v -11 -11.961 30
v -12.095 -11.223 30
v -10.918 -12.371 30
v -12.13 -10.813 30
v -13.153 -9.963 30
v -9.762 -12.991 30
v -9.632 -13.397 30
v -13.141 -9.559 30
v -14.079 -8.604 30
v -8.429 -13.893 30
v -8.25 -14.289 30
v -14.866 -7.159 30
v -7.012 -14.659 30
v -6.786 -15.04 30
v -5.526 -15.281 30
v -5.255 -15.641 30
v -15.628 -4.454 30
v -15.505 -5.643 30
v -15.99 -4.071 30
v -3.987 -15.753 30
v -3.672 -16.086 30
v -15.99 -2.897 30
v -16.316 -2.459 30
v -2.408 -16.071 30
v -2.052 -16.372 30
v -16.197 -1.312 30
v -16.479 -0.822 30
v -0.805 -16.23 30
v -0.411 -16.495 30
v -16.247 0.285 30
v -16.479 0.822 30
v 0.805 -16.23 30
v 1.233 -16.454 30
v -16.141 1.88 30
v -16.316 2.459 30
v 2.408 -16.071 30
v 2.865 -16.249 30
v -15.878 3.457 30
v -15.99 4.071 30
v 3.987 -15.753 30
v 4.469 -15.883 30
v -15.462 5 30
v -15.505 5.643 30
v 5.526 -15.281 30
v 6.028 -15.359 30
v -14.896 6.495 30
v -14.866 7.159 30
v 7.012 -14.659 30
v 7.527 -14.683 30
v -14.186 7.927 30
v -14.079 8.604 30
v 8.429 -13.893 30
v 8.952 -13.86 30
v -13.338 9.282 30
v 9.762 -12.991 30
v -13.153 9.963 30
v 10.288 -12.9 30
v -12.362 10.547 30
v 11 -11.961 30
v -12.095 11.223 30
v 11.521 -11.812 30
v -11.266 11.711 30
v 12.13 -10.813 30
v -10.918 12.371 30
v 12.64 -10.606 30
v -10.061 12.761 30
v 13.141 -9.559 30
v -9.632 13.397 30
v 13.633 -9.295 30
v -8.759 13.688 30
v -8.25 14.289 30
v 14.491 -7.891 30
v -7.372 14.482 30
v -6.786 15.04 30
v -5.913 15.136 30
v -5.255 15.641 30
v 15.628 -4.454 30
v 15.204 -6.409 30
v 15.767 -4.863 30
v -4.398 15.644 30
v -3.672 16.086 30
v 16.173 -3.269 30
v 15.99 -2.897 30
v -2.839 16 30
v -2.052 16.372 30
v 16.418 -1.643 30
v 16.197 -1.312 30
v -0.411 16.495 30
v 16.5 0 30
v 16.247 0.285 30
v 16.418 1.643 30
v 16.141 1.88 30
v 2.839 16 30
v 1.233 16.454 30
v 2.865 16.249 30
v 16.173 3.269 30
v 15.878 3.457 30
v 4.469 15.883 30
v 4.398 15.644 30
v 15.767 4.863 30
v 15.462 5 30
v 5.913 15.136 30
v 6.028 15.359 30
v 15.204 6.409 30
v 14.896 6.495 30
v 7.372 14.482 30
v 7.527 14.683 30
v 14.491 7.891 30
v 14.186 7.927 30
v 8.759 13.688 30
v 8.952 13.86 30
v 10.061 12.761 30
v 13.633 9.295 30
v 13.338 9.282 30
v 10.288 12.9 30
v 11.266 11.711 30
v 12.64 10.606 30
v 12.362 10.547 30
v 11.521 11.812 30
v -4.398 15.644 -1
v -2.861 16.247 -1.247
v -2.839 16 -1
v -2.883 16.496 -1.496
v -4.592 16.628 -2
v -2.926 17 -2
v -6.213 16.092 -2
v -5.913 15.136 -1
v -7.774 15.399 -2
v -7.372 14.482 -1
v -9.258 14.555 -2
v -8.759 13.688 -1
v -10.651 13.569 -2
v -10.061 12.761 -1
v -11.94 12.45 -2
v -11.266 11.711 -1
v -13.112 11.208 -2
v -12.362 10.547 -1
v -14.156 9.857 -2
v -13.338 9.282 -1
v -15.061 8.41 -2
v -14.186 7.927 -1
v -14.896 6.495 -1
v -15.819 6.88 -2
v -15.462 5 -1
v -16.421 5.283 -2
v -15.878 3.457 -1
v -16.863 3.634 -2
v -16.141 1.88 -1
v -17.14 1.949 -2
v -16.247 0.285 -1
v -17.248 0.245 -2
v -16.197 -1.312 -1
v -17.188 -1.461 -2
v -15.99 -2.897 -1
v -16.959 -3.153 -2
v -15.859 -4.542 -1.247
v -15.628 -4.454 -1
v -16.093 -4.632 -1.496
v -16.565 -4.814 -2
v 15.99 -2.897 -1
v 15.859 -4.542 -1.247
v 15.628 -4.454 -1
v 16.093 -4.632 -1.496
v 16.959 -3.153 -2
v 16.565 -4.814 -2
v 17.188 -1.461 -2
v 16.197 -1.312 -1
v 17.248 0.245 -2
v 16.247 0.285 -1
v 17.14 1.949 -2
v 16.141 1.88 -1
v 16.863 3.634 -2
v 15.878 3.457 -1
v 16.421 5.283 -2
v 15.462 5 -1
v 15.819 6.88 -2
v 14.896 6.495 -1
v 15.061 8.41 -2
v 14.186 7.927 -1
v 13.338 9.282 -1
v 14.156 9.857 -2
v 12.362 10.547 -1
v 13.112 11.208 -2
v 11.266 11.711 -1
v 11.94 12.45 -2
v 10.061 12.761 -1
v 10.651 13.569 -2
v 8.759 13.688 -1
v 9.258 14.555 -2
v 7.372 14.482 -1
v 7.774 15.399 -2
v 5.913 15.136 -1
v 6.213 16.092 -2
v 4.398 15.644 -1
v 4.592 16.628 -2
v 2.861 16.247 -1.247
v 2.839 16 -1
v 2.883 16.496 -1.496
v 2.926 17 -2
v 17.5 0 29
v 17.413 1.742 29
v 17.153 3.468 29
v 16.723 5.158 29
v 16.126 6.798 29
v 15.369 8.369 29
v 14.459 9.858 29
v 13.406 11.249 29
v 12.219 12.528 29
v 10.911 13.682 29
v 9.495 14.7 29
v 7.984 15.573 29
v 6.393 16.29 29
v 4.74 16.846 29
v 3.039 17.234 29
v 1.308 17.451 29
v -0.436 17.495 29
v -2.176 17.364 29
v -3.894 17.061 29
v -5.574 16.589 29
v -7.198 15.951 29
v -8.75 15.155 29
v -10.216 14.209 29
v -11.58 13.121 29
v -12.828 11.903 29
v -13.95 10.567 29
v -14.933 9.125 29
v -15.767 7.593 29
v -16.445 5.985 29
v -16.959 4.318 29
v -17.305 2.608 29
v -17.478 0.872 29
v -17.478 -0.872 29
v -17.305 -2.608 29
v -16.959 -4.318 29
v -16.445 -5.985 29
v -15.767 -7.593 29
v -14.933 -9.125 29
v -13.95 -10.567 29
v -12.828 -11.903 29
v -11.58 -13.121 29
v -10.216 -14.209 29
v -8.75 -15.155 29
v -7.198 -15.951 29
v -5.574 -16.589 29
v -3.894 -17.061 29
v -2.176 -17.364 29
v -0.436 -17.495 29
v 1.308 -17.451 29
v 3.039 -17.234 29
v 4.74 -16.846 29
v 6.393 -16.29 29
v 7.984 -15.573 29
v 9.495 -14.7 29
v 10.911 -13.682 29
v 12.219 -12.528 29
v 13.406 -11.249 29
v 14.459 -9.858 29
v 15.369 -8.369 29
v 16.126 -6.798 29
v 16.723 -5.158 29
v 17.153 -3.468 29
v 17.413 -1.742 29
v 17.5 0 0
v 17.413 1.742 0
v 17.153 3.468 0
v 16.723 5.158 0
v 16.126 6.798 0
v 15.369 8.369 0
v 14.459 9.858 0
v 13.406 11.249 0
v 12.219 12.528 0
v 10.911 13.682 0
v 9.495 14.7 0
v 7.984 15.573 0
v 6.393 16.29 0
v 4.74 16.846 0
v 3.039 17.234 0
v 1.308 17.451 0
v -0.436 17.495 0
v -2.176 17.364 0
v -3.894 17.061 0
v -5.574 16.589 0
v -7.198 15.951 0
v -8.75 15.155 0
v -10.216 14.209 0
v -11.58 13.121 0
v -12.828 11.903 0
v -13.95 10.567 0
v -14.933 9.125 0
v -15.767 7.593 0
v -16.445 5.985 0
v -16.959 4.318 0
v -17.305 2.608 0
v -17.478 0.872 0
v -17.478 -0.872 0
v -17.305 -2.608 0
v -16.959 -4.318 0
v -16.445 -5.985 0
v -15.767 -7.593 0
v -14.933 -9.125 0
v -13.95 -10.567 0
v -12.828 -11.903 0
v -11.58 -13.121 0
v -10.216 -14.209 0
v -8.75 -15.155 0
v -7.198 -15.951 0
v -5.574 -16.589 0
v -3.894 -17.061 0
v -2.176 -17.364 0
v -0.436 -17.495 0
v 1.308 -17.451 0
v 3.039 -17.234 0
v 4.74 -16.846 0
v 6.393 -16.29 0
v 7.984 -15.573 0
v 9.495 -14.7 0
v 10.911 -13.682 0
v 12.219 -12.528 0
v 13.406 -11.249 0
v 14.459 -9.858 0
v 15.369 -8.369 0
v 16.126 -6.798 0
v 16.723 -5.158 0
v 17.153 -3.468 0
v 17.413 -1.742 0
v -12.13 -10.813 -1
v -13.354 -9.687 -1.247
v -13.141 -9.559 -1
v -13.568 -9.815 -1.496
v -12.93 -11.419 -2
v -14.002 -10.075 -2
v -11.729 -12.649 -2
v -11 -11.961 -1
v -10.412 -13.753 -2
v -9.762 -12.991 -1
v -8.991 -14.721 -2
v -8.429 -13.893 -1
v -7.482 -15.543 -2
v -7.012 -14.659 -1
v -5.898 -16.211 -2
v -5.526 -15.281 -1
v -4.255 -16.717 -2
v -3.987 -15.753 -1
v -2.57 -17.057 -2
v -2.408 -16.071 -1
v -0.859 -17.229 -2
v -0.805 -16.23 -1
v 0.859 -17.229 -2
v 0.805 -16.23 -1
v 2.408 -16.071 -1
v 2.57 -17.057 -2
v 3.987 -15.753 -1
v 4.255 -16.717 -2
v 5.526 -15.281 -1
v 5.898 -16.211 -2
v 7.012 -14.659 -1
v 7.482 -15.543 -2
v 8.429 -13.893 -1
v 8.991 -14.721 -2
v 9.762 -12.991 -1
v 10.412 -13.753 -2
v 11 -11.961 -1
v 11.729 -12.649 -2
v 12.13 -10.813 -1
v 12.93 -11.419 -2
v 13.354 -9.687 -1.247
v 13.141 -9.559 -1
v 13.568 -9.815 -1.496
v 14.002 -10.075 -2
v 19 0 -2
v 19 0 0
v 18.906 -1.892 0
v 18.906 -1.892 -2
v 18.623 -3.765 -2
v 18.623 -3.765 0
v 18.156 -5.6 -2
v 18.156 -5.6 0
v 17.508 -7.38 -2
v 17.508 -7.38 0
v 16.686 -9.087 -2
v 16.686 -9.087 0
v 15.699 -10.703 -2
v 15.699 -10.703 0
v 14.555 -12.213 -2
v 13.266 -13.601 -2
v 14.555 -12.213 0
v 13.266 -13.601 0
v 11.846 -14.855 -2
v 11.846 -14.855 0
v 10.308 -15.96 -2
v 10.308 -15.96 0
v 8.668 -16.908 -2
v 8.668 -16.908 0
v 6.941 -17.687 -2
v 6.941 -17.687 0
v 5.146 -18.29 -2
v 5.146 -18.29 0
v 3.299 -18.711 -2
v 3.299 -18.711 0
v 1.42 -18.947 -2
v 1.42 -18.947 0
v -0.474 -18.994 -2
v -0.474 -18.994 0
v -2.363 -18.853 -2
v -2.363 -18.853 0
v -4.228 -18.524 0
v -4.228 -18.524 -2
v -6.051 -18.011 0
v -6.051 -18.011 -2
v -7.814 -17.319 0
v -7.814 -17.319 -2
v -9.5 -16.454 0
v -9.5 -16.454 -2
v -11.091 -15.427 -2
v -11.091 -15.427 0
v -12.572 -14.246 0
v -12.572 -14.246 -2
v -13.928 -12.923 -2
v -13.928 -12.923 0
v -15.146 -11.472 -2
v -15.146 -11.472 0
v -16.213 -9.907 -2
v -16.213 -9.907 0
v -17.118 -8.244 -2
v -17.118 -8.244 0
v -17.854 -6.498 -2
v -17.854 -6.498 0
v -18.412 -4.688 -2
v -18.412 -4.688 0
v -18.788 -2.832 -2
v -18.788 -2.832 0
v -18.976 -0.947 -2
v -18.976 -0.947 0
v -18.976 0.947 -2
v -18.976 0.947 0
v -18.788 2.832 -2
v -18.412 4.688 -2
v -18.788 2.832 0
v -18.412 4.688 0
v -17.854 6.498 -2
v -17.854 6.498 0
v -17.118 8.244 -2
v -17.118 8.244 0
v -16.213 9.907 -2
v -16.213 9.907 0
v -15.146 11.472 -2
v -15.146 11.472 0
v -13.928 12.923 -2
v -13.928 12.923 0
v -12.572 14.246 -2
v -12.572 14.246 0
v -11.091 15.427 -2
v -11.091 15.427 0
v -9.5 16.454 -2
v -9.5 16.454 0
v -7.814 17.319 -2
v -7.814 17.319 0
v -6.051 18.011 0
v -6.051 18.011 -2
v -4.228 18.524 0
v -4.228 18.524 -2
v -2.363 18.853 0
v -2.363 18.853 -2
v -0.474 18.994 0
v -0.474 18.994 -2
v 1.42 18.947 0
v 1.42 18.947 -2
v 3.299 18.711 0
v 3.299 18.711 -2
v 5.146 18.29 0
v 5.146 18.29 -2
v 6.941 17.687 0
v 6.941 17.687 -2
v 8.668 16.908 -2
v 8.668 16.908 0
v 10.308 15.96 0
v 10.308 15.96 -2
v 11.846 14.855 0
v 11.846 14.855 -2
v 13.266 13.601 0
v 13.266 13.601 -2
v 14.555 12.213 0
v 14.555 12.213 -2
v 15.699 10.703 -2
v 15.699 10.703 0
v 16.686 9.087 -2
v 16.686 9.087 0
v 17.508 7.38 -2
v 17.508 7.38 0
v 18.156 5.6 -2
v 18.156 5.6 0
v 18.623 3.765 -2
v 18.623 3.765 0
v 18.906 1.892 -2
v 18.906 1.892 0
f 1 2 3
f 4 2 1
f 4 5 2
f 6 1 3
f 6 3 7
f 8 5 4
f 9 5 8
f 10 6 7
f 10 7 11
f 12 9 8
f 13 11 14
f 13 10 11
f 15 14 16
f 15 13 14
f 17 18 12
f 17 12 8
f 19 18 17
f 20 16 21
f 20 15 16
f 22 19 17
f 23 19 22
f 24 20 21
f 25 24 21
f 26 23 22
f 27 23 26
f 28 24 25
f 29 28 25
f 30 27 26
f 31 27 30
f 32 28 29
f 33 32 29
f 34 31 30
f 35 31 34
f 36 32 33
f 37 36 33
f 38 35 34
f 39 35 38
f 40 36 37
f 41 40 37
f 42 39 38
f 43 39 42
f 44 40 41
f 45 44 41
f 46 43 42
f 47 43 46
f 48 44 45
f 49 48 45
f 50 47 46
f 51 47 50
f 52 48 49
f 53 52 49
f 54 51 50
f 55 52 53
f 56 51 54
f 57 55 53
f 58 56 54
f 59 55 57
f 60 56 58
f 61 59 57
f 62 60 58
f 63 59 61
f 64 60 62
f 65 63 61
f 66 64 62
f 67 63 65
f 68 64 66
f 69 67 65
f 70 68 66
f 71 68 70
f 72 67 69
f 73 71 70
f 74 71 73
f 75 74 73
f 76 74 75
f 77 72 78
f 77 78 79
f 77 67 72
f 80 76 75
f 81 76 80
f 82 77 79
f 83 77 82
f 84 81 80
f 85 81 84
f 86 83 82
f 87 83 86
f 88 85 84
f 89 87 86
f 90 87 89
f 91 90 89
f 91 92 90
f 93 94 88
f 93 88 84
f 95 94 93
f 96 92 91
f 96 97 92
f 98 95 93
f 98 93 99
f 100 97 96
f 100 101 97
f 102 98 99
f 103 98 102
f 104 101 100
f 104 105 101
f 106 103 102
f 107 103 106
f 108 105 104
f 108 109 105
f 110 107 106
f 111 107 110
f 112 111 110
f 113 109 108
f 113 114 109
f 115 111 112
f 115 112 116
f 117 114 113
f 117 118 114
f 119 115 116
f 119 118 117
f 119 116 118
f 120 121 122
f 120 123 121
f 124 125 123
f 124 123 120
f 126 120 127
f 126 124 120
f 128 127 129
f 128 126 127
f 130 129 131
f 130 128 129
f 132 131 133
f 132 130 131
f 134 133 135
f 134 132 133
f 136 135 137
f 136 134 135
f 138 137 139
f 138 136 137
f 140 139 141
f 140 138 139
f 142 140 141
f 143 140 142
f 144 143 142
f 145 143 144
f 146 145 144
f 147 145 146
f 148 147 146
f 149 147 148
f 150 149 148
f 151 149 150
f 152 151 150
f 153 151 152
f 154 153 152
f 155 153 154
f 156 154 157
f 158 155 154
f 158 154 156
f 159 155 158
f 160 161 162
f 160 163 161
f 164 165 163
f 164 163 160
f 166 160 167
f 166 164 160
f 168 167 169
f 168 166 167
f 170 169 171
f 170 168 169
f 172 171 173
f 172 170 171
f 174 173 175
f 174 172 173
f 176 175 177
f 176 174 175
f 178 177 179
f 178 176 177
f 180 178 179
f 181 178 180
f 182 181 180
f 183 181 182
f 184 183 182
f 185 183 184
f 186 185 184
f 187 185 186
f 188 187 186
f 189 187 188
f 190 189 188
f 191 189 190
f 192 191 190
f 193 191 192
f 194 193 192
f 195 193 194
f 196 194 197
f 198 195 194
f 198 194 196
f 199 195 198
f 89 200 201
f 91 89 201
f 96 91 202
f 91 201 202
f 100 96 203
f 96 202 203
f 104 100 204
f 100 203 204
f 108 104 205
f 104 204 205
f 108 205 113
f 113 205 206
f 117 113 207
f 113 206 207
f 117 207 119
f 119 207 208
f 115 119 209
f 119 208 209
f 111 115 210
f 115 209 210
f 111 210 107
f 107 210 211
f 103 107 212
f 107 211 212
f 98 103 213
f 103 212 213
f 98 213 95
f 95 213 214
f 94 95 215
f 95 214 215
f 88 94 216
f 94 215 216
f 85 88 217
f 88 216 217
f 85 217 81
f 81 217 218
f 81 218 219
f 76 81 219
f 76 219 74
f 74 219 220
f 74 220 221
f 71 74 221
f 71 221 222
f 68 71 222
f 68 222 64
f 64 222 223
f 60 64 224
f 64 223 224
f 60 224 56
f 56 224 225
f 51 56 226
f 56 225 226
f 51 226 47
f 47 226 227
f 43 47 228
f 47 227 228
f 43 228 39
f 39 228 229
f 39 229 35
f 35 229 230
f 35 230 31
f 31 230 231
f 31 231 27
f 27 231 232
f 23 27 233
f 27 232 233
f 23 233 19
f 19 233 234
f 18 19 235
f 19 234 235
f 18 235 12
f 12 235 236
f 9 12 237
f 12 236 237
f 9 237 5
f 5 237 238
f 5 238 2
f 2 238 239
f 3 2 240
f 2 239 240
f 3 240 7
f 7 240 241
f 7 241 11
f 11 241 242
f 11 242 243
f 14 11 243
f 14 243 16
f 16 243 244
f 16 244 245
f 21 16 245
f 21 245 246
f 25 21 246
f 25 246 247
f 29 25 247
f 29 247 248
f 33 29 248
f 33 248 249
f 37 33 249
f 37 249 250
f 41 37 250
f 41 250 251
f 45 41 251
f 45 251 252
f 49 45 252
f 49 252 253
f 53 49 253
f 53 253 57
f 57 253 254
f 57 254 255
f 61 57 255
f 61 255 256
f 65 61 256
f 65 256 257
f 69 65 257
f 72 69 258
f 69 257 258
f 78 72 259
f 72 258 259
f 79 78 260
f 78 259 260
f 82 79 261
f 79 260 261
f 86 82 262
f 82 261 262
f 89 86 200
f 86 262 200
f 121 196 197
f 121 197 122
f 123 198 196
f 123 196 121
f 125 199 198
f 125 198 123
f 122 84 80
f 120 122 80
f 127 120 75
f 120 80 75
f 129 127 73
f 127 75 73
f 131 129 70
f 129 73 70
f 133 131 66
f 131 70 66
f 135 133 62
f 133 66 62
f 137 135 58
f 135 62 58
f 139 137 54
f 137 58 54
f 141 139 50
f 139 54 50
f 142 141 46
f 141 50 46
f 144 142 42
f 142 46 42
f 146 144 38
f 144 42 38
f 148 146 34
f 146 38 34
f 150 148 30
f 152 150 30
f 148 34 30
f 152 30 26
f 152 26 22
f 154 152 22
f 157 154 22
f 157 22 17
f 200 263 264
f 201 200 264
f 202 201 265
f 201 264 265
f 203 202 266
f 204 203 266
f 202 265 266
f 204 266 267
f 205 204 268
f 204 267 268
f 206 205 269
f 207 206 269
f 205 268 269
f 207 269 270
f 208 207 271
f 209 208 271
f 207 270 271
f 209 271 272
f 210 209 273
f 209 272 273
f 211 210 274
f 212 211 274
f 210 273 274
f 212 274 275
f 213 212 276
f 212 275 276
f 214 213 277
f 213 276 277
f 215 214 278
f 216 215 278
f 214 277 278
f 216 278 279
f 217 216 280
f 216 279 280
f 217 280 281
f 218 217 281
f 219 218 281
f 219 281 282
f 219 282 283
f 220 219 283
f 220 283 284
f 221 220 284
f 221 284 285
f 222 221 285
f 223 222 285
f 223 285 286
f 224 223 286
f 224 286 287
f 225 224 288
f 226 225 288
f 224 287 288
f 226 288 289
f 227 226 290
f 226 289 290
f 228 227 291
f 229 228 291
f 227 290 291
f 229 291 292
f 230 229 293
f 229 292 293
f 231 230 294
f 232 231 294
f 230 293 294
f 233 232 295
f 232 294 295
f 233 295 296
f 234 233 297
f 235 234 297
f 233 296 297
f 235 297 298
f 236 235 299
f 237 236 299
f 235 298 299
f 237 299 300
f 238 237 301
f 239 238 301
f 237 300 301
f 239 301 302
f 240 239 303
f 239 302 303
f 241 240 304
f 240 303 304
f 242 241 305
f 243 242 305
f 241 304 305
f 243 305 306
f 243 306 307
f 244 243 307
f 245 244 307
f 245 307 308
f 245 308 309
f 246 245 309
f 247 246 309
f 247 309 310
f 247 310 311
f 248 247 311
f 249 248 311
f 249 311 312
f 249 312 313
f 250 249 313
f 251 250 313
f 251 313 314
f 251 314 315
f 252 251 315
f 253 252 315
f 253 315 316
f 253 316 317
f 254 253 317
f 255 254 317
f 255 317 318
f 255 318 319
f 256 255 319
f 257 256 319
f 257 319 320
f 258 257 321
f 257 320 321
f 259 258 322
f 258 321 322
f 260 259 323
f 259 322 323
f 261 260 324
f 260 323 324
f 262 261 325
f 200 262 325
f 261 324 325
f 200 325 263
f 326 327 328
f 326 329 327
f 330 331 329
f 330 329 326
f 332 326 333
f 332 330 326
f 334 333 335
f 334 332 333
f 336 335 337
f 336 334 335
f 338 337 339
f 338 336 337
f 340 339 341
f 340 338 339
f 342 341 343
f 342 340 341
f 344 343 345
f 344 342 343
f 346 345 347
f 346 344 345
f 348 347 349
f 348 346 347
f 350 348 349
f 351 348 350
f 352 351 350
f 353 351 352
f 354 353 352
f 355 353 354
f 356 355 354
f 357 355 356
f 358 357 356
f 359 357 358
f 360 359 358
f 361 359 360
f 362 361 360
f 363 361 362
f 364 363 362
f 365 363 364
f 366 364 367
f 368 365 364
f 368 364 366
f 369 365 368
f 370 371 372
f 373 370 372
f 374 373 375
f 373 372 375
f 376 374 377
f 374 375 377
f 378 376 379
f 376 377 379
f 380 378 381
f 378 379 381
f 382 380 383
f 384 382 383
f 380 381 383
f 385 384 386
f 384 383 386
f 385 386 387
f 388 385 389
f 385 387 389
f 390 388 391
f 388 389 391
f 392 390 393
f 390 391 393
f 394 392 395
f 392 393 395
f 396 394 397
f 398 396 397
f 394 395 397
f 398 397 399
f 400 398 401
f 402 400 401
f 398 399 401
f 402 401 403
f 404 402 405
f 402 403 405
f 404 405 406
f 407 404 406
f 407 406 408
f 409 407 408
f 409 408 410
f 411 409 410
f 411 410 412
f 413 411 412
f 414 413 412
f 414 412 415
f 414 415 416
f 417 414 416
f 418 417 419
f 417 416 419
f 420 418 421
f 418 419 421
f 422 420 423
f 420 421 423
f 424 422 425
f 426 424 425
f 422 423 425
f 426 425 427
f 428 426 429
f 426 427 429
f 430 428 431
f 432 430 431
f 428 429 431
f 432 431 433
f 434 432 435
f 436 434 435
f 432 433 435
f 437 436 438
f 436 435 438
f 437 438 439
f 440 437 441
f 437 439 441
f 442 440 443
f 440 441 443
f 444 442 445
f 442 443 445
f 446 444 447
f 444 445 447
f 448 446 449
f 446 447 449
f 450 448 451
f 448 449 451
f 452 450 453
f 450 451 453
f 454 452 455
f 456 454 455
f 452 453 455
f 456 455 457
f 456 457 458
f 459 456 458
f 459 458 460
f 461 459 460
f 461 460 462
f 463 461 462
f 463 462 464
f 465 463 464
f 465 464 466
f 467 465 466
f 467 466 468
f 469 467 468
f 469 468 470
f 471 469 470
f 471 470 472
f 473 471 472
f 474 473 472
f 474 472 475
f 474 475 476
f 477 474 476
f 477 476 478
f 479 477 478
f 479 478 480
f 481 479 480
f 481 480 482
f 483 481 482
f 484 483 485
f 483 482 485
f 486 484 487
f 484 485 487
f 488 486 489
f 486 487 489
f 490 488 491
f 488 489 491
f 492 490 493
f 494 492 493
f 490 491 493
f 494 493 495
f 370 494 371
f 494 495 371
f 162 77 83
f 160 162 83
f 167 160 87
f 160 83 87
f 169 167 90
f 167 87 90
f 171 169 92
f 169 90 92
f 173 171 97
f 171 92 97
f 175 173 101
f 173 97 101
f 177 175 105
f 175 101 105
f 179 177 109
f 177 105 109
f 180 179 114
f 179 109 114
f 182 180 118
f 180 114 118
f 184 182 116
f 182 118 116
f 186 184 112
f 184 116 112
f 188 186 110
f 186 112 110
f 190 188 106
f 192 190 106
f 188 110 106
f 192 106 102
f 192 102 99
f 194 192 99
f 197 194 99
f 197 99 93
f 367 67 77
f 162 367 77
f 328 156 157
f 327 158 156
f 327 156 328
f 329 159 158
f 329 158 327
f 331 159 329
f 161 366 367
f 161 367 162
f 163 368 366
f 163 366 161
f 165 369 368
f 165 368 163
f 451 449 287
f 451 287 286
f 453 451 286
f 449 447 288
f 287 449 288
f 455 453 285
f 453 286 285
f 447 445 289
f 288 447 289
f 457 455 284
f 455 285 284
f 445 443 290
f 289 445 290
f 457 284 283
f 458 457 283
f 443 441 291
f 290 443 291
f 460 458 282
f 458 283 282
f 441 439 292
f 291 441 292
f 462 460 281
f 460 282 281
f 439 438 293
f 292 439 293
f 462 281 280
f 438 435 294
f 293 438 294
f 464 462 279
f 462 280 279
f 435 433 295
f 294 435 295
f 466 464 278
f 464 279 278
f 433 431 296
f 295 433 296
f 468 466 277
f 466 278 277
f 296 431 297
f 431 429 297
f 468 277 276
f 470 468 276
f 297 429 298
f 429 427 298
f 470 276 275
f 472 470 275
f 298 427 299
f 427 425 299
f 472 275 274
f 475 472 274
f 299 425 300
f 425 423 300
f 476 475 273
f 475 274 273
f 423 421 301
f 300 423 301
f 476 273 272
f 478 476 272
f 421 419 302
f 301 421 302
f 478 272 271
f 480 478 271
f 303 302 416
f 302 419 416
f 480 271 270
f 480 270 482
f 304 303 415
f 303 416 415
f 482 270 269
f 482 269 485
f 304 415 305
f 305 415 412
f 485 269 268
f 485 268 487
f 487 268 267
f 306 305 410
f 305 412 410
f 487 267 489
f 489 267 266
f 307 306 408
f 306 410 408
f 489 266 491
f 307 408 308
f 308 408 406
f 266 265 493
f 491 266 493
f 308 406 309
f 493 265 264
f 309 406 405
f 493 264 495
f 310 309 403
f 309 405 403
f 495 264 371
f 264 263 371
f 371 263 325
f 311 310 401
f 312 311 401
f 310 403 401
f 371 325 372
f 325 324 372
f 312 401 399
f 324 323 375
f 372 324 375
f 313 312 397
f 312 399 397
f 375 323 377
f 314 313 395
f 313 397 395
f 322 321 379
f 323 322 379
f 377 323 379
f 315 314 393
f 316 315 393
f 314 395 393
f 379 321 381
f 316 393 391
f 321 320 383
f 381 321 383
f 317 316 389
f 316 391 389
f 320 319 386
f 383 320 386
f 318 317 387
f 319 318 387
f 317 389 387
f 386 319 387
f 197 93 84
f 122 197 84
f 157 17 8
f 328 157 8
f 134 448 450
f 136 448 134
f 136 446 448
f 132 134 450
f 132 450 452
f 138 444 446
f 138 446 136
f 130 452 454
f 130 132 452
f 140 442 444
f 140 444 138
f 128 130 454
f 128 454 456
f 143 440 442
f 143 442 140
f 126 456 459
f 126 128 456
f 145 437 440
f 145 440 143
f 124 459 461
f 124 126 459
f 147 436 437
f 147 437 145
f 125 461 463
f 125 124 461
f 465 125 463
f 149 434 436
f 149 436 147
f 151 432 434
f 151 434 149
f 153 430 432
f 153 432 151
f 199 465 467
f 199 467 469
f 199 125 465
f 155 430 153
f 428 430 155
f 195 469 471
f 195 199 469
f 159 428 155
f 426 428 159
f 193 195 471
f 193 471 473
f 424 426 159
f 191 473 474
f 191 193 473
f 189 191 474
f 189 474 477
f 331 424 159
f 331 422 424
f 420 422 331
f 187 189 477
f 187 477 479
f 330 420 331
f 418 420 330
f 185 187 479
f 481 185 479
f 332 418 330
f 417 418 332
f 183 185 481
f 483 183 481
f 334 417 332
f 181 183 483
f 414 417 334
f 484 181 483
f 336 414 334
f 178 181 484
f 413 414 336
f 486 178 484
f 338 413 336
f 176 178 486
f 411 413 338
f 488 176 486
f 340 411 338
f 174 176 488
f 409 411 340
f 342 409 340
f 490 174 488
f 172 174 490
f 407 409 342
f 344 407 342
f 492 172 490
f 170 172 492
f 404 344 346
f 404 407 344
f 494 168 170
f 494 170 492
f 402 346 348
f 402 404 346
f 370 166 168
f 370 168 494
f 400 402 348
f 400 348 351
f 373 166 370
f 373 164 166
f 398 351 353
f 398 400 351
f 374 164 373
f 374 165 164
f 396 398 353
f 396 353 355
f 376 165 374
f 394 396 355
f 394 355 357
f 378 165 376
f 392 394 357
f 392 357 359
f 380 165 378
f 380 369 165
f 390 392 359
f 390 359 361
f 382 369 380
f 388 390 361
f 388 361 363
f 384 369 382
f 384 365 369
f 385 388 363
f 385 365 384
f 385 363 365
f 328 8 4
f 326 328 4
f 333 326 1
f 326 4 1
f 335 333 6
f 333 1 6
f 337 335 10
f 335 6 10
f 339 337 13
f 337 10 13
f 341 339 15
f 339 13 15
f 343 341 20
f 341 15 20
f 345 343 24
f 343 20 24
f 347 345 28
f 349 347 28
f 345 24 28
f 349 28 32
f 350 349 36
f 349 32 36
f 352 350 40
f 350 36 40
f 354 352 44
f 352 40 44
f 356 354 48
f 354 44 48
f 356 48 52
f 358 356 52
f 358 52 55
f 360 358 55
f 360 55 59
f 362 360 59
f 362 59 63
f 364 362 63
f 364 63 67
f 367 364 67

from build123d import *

# Parameters (mm, degrees)
F0_R     = 17.5
F1_DEPTH = 30
F2_R     = 19
F3_DEPTH = 2
F4_SIZE  = 1
F5_SIZE  = 1


with BuildPart() as f1:
    # F0 (on Top) → F1 (new body)
    with BuildSketch(Plane.XY):
        Circle(F0_R)
        with BuildLine():
            ThreePointArc((-15.627753, -4.453744), (-13.778547, 8.614764), (-2.839454, 16))
            Line((-2.839454, 16), (2.839454, 16))
            ThreePointArc((2.839454, 16), (13.778547, 8.614764), (15.627753, -4.453744))
            Line((15.627753, -4.453744), (13.140933, -9.559204))
            ThreePointArc((13.140933, -9.559204), (0, -16.25), (-13.140933, -9.559204))
            Line((-13.140933, -9.559204), (-15.627753, -4.453744))
        make_face(mode=Mode.SUBTRACT)
    extrude(amount=F1_DEPTH)

    # F2 (on face) → F3 (join)
    with BuildSketch(Plane(origin=(0, 0, 0), x_dir=(1, 0, 0), z_dir=(0, 0, -1))):
        Circle(F2_R)
        with BuildLine():
            Line((-15.627753, 4.453744), (-13.140933, 9.559204))
            ThreePointArc((-13.140933, 9.559204), (0, 16.25), (13.140933, 9.559204))
            Line((13.140933, 9.559204), (15.627753, 4.453744))
            ThreePointArc((15.627753, 4.453744), (13.778547, -8.614764), (2.839454, -16))
            Line((2.839454, -16), (-2.839454, -16))
            ThreePointArc((-2.839454, -16), (-13.778547, -8.614764), (-15.627753, 4.453744))
        make_face(mode=Mode.SUBTRACT)
    extrude(amount=F3_DEPTH)

    # F4
    f4_edges = [f1.edges().sort_by_distance(p)[0] for p in [
        (-17.5, 0, 30),
    ]]
    chamfer(f4_edges, length=F4_SIZE)

    # F5
    f5_edges = [f1.edges().sort_by_distance(p)[0] for p in [
        (0, -16.25, -2),
        (14.384343, -7.006474, -2),
        (13.778547, 8.614764, -2),
        (0, 16, -2),
        (-13.778547, 8.614764, -2),
        (-14.384343, -7.006474, -2),
    ]]
    chamfer(f5_edges, length=F5_SIZE)


solid = f1.part
